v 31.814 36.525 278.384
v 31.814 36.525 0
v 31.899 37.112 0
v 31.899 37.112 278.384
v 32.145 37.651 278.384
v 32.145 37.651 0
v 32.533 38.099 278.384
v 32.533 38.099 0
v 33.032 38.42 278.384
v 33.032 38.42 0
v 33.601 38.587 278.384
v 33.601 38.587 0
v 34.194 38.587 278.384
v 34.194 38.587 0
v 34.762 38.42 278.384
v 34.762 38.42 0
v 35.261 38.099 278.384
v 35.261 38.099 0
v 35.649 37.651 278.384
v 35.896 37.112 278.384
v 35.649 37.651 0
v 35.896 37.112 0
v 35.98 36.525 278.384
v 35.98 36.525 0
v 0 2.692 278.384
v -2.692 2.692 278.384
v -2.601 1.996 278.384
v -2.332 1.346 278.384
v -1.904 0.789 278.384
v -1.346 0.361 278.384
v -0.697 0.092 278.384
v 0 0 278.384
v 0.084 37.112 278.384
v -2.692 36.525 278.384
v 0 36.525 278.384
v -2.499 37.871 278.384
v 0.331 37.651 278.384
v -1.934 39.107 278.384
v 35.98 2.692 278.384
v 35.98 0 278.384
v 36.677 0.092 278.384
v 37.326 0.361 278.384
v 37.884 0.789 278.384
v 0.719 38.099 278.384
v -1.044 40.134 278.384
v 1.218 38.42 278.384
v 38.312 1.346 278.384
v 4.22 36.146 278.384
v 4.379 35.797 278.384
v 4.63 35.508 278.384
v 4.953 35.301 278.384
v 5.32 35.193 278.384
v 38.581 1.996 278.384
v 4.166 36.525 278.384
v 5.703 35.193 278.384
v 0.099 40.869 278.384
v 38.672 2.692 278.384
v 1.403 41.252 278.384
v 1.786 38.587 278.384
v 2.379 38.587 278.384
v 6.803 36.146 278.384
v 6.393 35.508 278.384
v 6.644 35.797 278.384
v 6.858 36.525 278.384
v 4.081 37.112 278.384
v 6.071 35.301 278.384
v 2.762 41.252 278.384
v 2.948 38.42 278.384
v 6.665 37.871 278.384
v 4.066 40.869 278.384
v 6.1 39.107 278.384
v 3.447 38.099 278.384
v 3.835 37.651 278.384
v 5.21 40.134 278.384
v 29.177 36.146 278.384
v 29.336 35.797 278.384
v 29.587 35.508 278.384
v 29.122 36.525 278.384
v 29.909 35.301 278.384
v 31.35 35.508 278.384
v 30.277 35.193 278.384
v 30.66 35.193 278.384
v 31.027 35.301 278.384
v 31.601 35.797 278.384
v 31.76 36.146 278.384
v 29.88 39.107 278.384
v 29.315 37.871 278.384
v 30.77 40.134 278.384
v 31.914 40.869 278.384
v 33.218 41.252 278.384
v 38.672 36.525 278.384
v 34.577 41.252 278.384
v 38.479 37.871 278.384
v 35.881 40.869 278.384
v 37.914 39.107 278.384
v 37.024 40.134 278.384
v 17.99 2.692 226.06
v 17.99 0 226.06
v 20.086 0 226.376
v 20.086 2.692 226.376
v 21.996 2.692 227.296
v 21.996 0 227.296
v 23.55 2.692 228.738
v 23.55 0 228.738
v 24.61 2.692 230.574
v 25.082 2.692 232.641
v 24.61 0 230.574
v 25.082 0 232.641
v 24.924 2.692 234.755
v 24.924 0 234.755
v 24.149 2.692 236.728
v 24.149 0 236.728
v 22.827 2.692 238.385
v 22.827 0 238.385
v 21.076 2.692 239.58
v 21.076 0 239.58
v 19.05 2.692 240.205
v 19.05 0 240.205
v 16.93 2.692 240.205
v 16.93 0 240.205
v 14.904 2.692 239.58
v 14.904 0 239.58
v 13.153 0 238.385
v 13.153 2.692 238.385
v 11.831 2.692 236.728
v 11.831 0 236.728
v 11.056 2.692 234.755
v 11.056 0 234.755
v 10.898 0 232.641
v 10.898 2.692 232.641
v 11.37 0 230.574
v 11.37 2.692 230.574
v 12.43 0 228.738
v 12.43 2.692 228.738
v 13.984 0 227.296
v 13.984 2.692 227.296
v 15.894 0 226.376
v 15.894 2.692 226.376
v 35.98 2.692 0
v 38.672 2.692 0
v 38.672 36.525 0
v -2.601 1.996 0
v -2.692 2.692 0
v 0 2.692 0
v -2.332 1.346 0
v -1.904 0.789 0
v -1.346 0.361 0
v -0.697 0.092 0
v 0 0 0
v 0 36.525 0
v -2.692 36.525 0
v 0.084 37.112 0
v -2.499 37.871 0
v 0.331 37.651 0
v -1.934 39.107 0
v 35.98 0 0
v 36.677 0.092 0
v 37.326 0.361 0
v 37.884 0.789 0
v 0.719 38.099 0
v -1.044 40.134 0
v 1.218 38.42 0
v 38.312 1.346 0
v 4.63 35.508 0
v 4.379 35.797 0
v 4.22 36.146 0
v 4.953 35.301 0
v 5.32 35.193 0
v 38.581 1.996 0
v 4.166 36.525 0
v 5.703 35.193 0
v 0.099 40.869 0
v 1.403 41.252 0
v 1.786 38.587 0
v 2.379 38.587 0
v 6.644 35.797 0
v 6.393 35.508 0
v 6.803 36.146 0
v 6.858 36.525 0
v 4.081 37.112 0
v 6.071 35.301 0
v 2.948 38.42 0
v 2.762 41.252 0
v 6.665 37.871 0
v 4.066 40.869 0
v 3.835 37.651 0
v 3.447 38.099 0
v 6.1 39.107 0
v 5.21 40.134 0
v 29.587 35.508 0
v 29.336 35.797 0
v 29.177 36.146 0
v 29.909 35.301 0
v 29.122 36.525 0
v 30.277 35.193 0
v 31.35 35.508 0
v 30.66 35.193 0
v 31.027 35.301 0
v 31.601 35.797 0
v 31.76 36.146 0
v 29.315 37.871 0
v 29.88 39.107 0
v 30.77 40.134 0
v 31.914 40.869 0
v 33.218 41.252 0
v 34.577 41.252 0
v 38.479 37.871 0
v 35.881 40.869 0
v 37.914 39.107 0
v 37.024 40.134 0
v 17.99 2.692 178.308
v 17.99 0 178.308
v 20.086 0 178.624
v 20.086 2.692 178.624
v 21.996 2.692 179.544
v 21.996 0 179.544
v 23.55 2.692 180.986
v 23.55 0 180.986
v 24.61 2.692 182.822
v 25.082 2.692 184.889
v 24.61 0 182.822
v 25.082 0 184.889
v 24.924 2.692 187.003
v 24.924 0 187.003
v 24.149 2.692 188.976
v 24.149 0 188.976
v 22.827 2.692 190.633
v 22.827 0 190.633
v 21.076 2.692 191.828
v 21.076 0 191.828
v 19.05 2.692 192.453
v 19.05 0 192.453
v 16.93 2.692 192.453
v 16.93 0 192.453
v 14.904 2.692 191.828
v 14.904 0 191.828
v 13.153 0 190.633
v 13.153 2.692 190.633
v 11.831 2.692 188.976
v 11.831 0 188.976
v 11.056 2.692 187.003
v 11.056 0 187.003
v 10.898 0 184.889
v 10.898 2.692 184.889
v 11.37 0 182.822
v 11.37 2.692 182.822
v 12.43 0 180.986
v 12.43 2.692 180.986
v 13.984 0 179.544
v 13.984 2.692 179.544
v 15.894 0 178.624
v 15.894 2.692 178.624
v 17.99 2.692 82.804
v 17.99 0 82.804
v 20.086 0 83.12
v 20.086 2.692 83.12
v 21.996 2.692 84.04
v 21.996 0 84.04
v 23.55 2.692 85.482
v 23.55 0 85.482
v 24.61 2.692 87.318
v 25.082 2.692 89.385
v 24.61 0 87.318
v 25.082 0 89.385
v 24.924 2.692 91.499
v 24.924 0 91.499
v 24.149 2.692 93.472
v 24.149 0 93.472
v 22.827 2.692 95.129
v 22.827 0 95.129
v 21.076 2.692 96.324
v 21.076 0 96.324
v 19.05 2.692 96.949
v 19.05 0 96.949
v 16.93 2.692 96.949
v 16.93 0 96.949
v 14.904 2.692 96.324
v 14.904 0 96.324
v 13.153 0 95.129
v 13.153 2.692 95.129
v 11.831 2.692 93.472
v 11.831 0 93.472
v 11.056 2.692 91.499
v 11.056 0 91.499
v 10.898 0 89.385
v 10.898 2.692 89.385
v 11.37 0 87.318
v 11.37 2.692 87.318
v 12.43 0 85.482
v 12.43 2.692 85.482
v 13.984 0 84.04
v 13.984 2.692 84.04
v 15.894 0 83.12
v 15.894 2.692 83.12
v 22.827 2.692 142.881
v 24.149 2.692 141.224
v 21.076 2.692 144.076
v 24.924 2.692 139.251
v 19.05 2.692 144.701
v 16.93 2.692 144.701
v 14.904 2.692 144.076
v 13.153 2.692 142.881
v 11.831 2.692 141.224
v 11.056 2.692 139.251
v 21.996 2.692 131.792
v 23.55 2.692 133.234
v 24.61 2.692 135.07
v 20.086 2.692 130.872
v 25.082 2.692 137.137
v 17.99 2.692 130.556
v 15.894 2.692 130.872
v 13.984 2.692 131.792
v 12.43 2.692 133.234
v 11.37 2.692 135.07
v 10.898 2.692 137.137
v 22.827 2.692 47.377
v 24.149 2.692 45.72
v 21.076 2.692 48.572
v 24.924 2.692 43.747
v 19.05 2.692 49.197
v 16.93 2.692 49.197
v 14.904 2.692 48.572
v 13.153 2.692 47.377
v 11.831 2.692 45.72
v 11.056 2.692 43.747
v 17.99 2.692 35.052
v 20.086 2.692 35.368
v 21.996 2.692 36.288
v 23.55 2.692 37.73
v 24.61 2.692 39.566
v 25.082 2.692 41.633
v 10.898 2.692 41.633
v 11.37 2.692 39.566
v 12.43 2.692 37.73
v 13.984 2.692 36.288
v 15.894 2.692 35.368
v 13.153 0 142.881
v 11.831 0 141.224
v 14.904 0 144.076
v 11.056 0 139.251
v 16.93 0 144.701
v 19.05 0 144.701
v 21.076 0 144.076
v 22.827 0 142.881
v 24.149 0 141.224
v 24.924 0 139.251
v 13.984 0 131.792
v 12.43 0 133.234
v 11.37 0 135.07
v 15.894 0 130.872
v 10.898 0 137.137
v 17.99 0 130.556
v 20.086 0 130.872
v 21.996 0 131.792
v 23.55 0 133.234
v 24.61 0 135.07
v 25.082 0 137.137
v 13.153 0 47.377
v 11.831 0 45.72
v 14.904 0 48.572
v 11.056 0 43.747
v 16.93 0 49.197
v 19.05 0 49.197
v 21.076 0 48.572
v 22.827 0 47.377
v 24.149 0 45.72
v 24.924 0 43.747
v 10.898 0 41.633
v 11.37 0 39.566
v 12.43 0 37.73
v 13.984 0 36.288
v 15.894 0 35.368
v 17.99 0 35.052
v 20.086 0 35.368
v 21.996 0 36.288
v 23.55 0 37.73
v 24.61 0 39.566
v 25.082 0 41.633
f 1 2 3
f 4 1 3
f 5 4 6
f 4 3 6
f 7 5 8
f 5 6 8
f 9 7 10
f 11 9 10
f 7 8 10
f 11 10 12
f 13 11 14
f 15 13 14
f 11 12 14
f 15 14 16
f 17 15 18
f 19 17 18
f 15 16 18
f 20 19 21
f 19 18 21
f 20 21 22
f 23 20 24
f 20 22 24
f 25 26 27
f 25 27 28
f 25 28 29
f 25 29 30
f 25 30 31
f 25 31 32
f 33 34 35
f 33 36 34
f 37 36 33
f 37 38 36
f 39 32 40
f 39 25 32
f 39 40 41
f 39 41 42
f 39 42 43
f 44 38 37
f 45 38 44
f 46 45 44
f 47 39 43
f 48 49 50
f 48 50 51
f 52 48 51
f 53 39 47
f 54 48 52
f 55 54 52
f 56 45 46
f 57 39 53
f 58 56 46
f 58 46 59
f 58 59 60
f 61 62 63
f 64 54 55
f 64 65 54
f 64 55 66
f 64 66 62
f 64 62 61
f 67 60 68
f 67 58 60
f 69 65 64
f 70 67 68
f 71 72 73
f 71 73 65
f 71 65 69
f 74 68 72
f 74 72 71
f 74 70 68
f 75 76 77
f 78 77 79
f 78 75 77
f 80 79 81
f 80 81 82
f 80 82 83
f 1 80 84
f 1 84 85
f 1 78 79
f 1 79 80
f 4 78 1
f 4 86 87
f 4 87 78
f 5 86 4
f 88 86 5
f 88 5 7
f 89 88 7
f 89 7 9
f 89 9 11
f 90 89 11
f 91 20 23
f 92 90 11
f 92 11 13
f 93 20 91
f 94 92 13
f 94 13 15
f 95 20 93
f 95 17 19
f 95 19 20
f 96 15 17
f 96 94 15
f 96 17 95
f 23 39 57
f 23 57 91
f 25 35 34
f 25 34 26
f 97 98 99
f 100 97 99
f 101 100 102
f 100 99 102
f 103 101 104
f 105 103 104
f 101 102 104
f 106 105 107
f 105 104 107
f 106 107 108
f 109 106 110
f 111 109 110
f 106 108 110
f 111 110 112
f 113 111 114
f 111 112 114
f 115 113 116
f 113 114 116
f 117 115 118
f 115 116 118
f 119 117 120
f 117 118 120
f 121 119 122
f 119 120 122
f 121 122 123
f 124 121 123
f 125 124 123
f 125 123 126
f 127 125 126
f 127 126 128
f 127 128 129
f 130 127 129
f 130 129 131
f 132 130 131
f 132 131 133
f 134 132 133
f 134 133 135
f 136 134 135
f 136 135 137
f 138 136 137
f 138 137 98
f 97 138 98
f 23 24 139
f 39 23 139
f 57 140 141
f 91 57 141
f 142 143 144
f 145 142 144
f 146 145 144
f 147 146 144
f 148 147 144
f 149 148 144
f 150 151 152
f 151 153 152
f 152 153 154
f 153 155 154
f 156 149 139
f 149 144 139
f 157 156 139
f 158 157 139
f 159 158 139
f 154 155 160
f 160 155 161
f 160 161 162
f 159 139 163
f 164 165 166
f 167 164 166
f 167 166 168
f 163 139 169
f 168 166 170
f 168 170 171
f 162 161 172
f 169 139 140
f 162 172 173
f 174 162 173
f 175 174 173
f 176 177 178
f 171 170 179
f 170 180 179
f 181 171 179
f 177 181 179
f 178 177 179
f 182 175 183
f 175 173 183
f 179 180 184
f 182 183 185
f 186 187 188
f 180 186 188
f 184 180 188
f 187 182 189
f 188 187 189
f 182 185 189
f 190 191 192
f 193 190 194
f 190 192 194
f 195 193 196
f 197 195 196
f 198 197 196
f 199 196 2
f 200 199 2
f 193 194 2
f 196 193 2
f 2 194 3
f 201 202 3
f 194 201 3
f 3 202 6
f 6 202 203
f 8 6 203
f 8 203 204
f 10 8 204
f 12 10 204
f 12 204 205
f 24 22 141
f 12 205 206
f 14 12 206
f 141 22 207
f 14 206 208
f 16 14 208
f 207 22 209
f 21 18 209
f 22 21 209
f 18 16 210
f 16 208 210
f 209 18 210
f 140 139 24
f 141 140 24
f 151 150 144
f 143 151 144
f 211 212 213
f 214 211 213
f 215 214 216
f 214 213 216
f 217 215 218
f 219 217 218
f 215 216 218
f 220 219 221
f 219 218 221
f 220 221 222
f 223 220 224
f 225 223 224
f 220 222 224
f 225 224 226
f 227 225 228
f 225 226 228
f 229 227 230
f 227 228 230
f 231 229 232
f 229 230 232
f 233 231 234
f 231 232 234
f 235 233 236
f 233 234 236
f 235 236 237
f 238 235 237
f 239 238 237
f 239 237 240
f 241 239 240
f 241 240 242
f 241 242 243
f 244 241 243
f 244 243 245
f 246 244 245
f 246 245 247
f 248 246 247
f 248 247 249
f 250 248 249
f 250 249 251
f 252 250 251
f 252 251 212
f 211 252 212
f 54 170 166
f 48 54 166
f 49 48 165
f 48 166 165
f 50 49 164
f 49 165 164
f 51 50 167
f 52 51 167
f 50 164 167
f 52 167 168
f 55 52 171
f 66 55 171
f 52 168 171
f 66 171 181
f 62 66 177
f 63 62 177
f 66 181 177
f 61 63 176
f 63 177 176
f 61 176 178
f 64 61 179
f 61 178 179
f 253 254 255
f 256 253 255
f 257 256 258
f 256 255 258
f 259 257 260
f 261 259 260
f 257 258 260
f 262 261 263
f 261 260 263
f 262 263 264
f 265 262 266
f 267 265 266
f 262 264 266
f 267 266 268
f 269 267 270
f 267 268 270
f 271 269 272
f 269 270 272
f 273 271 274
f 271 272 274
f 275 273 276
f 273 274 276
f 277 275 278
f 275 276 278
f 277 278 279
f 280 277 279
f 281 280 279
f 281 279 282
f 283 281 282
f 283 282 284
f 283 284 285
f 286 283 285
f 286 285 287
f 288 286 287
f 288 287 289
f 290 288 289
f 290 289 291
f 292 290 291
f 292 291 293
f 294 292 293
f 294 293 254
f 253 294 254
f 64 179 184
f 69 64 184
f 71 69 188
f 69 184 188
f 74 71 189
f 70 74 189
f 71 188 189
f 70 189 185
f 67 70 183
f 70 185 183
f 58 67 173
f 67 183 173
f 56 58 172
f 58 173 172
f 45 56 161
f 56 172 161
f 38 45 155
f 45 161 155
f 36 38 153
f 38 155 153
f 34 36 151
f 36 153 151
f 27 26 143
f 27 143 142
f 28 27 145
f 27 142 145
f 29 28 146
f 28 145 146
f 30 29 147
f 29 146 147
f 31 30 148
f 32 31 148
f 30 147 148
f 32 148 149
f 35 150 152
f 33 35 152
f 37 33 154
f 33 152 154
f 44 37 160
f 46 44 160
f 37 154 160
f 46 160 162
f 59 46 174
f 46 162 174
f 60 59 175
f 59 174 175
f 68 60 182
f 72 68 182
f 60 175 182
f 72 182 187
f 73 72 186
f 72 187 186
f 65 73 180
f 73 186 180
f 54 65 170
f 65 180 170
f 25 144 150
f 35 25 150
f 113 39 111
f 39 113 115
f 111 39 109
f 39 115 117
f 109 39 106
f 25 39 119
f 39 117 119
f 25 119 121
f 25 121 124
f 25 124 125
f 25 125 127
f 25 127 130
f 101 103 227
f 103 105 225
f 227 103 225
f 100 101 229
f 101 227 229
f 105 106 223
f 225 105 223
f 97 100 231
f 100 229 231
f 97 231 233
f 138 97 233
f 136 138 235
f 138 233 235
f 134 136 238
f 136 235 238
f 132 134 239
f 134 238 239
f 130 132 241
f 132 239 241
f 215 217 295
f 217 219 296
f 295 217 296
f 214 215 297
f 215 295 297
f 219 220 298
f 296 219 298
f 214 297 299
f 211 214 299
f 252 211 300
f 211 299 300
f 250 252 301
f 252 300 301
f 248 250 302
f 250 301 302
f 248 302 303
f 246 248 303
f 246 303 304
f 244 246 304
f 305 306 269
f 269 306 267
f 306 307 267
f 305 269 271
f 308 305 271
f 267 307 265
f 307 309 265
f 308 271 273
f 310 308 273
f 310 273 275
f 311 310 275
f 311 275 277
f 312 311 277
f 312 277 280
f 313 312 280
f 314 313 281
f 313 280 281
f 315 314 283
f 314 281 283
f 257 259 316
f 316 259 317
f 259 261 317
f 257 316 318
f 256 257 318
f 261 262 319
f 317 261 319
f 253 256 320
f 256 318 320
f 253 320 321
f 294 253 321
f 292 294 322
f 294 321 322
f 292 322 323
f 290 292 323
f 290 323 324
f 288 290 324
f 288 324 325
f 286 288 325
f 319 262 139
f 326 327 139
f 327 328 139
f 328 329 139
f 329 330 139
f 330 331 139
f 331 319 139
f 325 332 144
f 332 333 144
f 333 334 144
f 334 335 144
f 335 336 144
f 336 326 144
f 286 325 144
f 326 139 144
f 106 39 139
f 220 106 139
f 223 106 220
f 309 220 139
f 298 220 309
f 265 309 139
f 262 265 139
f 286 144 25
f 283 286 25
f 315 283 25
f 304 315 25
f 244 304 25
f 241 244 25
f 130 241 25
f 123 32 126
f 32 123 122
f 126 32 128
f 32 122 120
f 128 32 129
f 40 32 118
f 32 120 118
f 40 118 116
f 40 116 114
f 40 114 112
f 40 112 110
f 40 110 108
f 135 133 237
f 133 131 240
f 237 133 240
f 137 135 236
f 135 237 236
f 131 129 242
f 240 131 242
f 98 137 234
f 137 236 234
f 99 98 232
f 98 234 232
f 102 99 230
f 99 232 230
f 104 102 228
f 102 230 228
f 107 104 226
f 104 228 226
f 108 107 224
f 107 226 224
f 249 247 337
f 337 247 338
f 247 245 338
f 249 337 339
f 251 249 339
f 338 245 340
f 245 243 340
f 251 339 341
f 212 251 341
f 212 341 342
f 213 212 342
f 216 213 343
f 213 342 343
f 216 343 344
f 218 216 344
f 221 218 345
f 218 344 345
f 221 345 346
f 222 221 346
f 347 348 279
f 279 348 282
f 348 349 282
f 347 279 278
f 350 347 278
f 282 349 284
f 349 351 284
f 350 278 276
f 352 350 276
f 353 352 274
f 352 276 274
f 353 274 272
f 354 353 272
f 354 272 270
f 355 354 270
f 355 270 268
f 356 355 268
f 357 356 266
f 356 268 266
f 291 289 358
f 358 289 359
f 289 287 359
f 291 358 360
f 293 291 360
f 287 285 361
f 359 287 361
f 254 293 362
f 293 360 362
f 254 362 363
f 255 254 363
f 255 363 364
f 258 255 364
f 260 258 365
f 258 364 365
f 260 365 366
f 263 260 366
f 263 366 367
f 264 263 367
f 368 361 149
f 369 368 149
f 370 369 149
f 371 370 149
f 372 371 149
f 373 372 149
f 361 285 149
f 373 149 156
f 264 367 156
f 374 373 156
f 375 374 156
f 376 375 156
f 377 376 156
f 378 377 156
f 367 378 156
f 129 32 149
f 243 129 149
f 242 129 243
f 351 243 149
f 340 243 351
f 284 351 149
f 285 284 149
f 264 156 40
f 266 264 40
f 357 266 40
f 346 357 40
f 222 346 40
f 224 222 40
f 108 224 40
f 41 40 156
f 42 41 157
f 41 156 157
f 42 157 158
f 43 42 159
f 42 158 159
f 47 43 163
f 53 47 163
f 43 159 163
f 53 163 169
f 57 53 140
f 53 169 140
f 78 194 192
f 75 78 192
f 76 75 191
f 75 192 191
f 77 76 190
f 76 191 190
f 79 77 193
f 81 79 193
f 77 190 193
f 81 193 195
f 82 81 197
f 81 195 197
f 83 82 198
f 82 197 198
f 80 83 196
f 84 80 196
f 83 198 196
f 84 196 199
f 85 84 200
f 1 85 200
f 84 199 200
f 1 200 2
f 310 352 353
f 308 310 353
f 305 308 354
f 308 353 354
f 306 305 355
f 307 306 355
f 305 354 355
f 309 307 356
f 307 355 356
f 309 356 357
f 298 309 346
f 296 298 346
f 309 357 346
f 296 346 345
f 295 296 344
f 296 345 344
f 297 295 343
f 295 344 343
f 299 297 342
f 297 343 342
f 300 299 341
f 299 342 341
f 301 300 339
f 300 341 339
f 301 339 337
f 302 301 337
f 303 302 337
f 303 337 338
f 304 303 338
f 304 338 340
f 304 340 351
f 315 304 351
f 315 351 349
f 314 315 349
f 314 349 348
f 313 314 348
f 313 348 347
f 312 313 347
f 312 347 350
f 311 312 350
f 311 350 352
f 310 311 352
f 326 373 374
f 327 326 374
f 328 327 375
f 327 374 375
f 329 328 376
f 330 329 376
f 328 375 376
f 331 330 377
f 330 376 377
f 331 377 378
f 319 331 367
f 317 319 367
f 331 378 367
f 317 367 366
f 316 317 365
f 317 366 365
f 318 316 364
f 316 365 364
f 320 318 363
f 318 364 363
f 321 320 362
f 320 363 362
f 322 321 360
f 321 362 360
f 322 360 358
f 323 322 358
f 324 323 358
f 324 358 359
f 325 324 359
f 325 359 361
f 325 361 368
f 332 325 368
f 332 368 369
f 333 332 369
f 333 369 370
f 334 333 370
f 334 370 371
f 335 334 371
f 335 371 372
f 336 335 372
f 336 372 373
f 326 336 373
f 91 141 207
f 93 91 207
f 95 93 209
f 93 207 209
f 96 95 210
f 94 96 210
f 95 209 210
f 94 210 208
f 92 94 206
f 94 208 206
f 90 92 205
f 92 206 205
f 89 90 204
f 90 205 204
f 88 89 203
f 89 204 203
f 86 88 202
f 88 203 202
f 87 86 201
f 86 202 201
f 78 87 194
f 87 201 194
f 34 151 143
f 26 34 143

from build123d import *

# Parameters (mm, degrees)
BOSS_EXTRUDE1_DEPTH = 278.384
SKETCH2_R           = 7.112
CUT_EXTRUDE1_DEPTH  = 285.075569203
LPATTERN1_COUNT     = 5
LPATTERN1_PITCH     = 47.752


with BuildPart() as part:
    # Sketch1 → Boss-Extrude1 (new body)
    with BuildSketch(Plane.XY):
        with BuildLine():
            Line((0, 0), (35.98, 0))
            ThreePointArc((35.98, 0), (37.883814298, 0.788585702), (38.6724, 2.6924))
            Line((38.6724, 2.6924), (38.6724, 36.5252))
            ThreePointArc((38.6724, 36.5252), (33.8972, 41.3004), (29.122, 36.5252))
            ThreePointArc((29.122, 36.5252), (30.4682, 35.179), (31.8144, 36.5252))
            ThreePointArc((31.8144, 36.5252), (33.8972, 38.608), (35.98, 36.5252))
            Line((35.98, 36.5252), (35.98, 2.6924))
            Line((35.98, 2.6924), (0, 2.6924))
            Line((0, 2.6924), (0, 36.5252))
            ThreePointArc((0, 36.5252), (2.0828, 38.608), (4.1656, 36.5252))
            ThreePointArc((4.1656, 36.5252), (5.5118, 35.179), (6.858, 36.5252))
            ThreePointArc((6.858, 36.5252), (2.0828, 41.3004), (-2.6924, 36.5252))
            Line((-2.6924, 36.5252), (-2.6924, 2.6924))
            ThreePointArc((-2.6924, 2.6924), (-1.903814298, 0.788585702), (0, 0))
        make_face()
    extrude(amount=BOSS_EXTRUDE1_DEPTH)

    # Sketch2 → Cut-Extrude1 (cut, through all)
    with BuildSketch(Plane(origin=(0, 0, 0), x_dir=(-1, 0, 0), z_dir=(0, -1, 0))):
        with Locations(Location((-17.99, -42.164, 0), (0, 0, 90))):
            Circle(SKETCH2_R)
    cut_extrude1 = extrude(amount=-CUT_EXTRUDE1_DEPTH, mode=Mode.SUBTRACT)

    # LPattern1: Cut-Extrude1 ×5
    with Locations(*[(0, 0, i * LPATTERN1_PITCH) for i in range(1, LPATTERN1_COUNT)]):
        add(cut_extrude1, mode=Mode.SUBTRACT)


solid = part.part
